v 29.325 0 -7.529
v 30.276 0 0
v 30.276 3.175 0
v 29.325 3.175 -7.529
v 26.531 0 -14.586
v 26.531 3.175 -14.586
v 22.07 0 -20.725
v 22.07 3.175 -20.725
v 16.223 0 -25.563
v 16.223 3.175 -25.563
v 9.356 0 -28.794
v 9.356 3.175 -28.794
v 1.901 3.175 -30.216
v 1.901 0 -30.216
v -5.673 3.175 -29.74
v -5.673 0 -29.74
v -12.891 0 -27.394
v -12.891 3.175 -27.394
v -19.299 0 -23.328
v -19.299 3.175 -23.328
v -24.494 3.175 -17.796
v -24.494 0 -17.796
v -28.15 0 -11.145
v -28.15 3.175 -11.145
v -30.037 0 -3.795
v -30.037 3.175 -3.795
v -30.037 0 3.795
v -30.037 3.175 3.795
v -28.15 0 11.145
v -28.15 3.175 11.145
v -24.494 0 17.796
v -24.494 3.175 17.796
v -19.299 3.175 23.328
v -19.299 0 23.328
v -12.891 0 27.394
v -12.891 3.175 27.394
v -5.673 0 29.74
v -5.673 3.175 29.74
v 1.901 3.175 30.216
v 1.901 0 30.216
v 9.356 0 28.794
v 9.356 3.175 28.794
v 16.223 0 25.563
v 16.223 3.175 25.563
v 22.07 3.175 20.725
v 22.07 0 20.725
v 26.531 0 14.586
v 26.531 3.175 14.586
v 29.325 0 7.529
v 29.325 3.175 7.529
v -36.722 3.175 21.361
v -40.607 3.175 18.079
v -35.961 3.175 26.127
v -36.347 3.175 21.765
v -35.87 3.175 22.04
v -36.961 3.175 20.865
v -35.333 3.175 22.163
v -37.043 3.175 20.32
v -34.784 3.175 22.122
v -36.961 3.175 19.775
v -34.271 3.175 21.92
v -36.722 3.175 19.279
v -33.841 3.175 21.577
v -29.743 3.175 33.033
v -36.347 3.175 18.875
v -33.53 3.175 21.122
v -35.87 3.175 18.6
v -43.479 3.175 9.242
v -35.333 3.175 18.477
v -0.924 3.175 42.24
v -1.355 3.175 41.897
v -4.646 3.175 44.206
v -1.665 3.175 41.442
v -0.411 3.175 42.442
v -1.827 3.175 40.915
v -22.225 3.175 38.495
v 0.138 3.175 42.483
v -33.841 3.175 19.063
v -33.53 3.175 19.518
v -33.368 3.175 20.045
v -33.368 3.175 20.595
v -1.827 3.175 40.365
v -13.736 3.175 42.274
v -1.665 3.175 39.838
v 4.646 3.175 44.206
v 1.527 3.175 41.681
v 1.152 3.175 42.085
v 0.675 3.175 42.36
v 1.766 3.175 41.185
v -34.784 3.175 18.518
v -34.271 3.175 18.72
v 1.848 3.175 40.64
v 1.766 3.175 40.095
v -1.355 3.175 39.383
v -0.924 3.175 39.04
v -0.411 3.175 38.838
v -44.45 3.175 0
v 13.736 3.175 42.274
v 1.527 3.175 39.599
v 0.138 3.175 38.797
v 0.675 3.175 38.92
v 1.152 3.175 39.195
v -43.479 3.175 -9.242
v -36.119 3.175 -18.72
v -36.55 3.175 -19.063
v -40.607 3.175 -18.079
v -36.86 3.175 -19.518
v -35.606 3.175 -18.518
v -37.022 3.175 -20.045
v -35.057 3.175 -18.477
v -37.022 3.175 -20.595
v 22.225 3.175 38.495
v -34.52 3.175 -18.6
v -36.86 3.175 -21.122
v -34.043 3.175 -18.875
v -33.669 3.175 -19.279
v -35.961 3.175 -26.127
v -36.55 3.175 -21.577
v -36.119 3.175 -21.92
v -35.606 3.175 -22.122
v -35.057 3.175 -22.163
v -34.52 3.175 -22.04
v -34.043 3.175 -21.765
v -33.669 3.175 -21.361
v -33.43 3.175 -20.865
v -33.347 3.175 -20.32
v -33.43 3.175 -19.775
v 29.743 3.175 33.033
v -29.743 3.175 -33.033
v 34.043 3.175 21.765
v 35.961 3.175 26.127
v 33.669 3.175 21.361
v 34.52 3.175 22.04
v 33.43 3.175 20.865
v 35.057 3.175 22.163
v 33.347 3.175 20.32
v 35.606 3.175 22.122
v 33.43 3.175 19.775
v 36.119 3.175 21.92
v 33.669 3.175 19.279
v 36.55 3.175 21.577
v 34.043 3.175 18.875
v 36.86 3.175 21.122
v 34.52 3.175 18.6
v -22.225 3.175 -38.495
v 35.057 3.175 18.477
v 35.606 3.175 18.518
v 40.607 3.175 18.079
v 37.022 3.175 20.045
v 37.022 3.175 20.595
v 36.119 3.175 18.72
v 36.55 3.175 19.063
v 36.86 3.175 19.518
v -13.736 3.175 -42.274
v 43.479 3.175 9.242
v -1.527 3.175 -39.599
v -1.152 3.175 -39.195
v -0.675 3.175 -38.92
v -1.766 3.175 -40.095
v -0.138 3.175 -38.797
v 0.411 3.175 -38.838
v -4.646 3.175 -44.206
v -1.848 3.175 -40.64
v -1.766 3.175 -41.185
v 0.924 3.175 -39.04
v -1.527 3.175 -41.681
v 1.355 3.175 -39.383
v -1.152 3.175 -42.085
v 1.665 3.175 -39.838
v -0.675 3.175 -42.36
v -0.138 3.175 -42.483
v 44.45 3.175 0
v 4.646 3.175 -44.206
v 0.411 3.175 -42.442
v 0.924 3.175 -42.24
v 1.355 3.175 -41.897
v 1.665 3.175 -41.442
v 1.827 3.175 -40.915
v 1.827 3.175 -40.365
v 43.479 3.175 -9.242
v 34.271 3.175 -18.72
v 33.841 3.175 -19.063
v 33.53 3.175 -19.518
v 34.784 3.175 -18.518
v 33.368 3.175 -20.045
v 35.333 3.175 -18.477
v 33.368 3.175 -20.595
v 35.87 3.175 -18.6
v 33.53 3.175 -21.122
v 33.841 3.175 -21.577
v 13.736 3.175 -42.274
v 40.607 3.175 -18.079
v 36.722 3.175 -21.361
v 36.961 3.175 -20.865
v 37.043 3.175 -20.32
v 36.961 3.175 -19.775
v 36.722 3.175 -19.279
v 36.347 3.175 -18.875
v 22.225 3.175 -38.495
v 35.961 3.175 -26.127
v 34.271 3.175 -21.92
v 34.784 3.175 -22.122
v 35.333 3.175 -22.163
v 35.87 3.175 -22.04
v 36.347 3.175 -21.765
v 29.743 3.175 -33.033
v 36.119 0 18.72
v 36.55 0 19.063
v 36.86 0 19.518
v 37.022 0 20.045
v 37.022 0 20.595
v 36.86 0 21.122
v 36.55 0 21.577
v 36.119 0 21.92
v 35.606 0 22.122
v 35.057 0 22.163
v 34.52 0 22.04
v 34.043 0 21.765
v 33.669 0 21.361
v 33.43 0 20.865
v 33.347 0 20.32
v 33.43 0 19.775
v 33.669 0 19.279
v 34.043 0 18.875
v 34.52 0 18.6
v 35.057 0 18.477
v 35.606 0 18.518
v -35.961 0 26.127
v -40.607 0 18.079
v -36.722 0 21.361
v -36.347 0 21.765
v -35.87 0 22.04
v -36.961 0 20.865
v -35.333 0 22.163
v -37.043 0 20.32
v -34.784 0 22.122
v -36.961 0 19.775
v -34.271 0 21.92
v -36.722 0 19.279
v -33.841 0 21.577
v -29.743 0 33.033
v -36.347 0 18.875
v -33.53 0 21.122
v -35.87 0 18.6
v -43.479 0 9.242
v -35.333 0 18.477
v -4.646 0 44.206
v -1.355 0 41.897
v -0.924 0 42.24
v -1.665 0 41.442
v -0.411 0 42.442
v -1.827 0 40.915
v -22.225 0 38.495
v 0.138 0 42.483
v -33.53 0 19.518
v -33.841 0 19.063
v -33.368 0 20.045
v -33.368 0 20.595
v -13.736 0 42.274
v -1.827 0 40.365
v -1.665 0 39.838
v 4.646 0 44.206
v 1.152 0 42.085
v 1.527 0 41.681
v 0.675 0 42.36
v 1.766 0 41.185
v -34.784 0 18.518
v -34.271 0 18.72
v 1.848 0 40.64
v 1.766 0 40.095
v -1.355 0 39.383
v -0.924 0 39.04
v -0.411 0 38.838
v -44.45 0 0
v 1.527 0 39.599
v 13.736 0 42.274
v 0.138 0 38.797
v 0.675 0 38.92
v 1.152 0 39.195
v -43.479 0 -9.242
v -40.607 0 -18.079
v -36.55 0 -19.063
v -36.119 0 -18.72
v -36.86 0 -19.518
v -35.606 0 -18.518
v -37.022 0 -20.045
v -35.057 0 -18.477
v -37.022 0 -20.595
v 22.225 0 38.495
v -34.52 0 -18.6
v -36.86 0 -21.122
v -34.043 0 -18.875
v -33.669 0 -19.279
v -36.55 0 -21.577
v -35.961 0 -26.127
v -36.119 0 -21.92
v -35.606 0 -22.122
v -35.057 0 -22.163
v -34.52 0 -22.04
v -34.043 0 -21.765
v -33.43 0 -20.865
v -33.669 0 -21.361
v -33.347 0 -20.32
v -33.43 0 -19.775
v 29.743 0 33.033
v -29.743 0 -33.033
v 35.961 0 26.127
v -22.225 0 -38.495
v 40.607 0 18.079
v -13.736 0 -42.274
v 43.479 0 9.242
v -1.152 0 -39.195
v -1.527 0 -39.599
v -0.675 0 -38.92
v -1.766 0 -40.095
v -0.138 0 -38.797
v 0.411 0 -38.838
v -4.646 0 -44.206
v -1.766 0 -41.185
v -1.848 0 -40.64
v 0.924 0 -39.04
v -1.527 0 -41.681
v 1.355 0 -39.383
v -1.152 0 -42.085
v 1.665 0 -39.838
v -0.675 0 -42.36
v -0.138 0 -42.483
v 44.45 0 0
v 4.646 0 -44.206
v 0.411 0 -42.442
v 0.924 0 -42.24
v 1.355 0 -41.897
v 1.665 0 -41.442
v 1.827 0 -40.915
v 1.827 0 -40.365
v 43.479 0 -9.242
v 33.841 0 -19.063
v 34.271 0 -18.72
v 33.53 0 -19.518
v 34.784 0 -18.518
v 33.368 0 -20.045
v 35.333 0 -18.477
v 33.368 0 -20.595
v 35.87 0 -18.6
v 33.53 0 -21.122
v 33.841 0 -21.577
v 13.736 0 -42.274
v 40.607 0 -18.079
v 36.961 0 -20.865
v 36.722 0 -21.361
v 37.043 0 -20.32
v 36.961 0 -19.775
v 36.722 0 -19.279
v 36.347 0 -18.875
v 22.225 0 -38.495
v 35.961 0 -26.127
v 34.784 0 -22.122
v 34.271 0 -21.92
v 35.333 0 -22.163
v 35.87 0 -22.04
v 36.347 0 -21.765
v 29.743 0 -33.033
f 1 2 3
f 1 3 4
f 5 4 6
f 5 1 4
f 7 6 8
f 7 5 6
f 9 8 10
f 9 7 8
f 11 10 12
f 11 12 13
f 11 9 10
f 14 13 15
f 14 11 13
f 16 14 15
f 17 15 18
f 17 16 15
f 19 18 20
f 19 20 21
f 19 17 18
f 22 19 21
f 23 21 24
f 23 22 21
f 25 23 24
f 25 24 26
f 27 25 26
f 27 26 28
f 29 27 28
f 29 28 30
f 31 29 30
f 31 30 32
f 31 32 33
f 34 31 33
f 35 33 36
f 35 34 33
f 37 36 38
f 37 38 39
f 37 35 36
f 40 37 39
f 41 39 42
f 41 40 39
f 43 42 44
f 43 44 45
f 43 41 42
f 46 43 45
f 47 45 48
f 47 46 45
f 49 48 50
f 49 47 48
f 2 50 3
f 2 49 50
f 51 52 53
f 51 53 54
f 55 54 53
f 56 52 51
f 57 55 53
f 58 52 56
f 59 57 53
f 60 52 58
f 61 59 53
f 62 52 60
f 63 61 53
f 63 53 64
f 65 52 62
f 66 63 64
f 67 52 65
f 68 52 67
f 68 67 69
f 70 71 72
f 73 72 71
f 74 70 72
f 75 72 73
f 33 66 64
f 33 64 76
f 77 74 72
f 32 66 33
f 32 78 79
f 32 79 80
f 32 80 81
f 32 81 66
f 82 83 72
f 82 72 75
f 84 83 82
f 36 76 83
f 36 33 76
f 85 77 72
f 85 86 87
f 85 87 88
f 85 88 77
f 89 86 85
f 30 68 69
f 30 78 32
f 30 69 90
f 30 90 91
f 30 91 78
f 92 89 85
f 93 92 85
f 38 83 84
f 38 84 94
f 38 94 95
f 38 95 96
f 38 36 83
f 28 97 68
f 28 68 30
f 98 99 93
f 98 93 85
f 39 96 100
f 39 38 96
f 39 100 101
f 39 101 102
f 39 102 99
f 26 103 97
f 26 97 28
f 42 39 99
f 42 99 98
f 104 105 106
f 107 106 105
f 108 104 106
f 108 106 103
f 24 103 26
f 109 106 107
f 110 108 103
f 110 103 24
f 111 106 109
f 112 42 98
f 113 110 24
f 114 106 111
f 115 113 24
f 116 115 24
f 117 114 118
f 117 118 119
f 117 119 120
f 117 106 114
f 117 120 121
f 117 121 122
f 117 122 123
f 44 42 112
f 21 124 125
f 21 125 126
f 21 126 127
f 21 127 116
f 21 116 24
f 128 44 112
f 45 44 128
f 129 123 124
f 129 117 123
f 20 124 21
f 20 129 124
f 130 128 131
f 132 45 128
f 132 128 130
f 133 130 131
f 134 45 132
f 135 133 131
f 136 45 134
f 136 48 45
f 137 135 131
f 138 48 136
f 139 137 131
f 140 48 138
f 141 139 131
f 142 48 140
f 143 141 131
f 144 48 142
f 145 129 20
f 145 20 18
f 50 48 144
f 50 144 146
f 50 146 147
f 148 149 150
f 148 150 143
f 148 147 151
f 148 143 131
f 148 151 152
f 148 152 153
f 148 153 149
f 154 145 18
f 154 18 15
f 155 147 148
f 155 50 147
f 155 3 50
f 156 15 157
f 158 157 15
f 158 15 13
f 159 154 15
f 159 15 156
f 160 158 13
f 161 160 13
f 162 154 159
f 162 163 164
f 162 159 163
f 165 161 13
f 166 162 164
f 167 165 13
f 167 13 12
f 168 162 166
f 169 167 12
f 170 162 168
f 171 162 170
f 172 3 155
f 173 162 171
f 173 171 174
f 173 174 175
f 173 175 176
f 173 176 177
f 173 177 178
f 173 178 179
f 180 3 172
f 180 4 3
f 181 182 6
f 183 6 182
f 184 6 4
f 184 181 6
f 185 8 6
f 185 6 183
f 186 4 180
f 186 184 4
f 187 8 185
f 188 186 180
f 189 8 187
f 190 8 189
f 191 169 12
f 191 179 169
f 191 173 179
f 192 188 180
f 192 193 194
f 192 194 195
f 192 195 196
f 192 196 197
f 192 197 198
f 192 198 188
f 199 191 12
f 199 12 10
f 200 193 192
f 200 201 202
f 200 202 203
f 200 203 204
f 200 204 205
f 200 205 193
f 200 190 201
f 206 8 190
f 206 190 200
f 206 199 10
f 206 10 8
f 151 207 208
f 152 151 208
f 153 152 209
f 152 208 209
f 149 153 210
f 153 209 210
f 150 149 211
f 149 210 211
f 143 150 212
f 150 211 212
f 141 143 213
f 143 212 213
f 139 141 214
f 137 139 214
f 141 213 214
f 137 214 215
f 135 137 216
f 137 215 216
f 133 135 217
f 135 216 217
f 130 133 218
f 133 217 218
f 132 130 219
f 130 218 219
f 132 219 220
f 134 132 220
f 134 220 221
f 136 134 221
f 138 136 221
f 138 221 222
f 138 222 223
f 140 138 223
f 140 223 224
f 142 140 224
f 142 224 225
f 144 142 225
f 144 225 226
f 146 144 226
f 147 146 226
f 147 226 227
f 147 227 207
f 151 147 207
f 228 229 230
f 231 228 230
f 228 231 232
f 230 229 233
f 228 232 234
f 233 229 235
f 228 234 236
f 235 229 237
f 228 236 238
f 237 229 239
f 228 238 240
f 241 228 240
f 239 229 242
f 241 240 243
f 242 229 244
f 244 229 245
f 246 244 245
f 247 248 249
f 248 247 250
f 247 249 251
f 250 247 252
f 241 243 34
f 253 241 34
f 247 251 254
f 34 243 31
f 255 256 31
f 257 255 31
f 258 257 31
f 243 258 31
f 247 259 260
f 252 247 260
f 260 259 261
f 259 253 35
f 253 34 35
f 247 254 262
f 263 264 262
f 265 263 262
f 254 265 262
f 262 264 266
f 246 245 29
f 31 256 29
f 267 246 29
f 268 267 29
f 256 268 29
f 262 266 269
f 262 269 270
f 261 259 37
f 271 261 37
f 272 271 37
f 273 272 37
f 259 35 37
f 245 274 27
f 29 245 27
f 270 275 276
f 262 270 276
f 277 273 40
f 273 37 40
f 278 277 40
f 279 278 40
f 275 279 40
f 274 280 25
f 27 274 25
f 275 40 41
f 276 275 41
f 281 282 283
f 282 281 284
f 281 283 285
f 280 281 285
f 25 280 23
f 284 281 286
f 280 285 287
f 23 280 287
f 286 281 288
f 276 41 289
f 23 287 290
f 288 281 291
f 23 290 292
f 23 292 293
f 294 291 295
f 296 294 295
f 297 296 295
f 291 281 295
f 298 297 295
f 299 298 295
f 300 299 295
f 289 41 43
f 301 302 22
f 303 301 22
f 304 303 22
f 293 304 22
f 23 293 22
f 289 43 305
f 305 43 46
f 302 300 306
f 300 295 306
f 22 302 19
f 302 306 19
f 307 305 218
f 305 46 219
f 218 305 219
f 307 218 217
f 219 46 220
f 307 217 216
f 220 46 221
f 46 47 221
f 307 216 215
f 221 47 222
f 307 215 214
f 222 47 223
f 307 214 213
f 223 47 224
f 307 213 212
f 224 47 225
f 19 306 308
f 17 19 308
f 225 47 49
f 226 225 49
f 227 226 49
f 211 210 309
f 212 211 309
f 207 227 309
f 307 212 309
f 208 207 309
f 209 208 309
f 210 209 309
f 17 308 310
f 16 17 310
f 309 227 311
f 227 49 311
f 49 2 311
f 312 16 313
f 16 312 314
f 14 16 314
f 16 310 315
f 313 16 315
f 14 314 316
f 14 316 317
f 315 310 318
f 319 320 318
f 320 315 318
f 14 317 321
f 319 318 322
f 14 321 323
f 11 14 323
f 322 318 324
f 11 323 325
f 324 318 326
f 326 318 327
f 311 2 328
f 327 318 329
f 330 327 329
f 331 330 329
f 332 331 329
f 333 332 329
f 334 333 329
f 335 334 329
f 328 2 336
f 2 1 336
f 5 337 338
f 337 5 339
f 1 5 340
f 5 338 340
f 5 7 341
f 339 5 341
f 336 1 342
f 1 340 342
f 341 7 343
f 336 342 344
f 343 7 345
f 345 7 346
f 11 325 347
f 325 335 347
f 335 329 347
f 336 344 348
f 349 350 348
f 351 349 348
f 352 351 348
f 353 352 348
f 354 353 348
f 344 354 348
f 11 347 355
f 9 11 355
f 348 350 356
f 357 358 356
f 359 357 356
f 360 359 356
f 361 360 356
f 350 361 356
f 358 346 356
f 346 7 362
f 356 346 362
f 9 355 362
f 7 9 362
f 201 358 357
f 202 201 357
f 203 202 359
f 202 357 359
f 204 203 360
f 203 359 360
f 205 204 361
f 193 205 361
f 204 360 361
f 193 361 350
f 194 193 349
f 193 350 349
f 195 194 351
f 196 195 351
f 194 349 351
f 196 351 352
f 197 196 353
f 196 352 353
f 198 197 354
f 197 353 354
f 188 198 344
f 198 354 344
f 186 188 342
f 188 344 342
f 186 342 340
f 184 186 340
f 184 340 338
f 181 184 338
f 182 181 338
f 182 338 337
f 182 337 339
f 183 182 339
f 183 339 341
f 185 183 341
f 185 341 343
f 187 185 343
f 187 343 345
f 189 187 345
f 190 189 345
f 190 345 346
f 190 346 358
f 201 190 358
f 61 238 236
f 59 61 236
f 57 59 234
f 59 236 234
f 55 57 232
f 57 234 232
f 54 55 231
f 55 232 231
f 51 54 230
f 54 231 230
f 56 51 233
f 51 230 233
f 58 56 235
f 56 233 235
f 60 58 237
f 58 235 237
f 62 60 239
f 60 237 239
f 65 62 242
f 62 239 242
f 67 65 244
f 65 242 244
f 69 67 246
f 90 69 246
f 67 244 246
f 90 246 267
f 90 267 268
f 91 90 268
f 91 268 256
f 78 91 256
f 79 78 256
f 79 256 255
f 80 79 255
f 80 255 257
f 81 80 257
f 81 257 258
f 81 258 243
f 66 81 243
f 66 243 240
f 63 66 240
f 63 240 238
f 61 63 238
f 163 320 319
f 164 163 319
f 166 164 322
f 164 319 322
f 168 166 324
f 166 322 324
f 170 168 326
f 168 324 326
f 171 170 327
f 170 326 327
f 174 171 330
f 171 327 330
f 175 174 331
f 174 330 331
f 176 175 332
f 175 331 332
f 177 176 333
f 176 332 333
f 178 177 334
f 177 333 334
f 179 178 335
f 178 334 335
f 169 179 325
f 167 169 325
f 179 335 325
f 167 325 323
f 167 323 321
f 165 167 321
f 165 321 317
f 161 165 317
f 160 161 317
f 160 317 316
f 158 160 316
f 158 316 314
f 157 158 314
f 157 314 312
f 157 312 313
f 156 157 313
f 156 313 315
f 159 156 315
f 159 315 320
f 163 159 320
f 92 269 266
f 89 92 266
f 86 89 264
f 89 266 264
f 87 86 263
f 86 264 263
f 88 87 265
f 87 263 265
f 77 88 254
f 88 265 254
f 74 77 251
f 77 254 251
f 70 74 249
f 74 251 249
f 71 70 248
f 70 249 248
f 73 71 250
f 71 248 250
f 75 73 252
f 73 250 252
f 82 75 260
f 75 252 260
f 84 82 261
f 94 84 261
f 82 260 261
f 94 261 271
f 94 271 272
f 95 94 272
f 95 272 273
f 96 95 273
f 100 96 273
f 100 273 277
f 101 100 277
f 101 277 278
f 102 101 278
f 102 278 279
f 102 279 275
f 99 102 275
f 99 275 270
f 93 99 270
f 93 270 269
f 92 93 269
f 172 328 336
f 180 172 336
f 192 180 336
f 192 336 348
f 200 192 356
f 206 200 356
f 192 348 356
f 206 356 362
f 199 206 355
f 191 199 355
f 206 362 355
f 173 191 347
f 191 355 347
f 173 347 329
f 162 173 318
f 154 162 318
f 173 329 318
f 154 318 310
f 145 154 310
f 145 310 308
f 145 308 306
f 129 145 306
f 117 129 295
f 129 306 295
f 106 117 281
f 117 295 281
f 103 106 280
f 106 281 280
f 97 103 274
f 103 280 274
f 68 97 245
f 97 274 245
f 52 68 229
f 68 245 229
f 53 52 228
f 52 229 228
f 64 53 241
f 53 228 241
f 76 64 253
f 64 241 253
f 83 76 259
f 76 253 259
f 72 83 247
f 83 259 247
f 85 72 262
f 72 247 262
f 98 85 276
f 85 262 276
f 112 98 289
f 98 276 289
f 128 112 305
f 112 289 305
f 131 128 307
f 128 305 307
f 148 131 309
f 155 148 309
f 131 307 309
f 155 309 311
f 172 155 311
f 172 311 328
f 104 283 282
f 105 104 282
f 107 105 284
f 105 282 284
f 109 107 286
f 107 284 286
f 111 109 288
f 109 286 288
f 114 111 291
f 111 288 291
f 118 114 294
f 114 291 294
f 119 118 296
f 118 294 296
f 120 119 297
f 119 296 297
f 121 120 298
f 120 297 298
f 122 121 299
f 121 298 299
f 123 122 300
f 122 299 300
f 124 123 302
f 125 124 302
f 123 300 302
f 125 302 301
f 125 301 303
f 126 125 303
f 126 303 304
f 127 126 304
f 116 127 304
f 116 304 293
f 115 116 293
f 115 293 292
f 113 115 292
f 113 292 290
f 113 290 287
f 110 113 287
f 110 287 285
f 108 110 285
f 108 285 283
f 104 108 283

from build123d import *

# Parameters (mm, degrees)
SKETCH1_R                 = 44.45
SKETCH1_R_2               = 30.275917709
BOSS_EXTRUDE1_DEPTH       = 3.175
F_6_CLEARANCE_HOLE1_D     = 3.6957
F_6_CLEARANCE_HOLE1_DEPTH = 3.176
CIRPATTERN1_COUNT         = 6


with BuildPart() as part:
    # Sketch1 → Boss-Extrude1 (new body)
    with BuildSketch(Plane(origin=(0, 0, 0), x_dir=(1, 0, 0), z_dir=(0, 1, 0))):
        Circle(SKETCH1_R)
        Circle(SKETCH1_R_2, mode=Mode.SUBTRACT)
    extrude(amount=BOSS_EXTRUDE1_DEPTH)

    # #6 Clearance Hole1
    with Locations(Plane(origin=(0, 3.175, 0), x_dir=(1, 0, 0), z_dir=(0, 1, 0))):
        with Locations((0, 40.64)):
            f_6_clearance_hole1 = Hole(F_6_CLEARANCE_HOLE1_D / 2, depth=F_6_CLEARANCE_HOLE1_DEPTH)

    # CirPattern1: #6 Clearance Hole1 ×6 about axis
    cirpattern1_axis = Axis((0, 0, 0), (0, 1, 0))
    for i in range(1, CIRPATTERN1_COUNT):
        add(f_6_clearance_hole1.rotate(cirpattern1_axis, i * 360 / CIRPATTERN1_COUNT), mode=Mode.SUBTRACT)


solid = part.part
